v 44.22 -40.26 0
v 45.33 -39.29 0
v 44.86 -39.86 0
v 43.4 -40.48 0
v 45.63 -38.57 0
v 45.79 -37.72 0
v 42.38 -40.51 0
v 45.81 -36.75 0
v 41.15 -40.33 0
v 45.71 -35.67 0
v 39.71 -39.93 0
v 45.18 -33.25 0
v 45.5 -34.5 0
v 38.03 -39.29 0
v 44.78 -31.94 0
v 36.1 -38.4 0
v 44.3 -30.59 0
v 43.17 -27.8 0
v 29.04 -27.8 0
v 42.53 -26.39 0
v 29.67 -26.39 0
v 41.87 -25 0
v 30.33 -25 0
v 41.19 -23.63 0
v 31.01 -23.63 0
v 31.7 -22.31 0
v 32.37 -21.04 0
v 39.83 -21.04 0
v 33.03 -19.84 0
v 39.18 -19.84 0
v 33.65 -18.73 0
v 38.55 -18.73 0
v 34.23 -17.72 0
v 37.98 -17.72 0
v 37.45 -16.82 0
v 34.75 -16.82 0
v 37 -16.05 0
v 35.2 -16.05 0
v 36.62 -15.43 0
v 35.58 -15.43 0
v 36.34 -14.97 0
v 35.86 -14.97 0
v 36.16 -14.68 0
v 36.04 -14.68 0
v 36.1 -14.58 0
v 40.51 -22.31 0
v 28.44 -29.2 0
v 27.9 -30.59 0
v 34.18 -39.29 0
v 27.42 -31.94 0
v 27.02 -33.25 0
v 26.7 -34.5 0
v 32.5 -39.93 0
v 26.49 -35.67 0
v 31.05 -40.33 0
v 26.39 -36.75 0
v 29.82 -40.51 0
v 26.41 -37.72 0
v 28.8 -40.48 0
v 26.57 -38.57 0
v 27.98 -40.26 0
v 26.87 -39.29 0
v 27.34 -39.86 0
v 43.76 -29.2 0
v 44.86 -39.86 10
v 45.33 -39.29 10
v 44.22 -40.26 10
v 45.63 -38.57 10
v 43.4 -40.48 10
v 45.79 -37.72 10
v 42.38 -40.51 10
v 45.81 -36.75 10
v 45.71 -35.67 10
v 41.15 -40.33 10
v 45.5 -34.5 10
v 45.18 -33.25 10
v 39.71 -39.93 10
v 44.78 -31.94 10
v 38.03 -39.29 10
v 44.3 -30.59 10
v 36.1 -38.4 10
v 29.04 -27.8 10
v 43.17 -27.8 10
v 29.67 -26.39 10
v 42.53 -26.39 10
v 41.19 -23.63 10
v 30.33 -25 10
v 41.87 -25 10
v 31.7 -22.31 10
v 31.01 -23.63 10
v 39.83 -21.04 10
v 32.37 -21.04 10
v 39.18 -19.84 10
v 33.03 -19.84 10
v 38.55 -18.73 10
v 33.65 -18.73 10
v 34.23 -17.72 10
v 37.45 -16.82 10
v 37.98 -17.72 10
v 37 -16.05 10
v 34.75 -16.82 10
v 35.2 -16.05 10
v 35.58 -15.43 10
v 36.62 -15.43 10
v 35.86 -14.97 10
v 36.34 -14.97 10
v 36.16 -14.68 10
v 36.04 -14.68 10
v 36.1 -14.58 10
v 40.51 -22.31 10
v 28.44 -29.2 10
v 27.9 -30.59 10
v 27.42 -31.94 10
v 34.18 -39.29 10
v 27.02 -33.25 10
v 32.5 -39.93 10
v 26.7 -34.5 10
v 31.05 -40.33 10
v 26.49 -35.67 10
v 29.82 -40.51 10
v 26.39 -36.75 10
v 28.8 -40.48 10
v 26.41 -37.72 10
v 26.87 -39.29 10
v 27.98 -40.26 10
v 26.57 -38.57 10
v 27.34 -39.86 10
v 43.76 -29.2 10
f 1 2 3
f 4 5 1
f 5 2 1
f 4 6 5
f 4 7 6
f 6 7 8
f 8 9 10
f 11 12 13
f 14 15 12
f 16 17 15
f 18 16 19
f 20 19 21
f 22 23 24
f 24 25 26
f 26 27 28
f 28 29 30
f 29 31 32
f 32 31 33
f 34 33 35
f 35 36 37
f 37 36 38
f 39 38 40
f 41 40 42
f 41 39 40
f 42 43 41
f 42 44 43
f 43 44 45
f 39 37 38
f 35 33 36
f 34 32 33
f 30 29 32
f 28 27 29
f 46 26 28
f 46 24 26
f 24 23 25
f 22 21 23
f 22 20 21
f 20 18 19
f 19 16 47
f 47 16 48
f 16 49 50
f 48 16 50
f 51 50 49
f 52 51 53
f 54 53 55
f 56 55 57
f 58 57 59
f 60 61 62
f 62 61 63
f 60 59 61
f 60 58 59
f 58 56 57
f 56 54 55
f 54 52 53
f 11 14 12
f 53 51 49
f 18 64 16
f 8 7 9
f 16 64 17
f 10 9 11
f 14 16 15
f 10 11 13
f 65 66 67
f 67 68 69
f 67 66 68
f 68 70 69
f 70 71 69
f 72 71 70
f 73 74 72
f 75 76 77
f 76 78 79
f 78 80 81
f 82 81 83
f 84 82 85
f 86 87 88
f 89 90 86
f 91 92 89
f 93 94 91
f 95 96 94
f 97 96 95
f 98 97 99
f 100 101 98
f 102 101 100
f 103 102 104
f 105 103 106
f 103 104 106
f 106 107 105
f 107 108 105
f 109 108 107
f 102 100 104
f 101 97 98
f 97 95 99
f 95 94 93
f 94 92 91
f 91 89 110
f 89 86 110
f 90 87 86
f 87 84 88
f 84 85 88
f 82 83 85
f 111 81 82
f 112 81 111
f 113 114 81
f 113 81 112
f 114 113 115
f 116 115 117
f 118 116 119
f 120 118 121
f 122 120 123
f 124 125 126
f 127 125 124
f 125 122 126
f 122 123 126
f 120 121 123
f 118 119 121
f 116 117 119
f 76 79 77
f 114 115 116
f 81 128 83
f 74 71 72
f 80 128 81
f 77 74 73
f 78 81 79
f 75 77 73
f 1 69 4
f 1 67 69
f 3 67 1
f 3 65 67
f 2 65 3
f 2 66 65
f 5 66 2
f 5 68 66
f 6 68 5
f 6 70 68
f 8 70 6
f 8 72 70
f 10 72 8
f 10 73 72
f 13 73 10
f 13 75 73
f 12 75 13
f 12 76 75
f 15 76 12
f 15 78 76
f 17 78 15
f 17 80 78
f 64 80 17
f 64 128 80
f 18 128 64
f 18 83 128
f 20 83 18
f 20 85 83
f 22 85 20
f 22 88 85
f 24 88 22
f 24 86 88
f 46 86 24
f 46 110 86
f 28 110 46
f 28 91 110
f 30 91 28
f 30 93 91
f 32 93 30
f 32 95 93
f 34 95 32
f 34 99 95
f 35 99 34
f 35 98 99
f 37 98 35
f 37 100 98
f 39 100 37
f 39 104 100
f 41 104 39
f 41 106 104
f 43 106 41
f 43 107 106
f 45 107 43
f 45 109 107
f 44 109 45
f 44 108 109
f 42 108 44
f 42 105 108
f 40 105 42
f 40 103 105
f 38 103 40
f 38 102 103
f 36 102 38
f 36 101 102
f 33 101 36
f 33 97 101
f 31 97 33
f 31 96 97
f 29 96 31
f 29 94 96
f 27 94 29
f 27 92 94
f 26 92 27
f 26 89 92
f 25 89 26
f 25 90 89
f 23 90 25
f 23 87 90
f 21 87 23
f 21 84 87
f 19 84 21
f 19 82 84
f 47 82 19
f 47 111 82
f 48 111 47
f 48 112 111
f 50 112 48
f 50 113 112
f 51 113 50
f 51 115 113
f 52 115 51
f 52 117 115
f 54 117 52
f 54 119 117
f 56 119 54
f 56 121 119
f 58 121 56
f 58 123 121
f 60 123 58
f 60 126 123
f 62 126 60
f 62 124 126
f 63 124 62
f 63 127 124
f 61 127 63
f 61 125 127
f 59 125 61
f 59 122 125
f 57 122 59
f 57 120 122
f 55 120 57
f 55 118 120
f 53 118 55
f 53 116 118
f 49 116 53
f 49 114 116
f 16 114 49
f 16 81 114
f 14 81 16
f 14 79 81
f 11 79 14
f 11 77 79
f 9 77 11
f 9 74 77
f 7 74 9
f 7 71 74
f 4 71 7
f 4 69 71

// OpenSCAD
linear_extrude(height = 10, center = false) {

polygon(points=[[36.1,-14.58],[36.04,-14.68],[35.86,-14.97],[35.58,-15.43],[35.2,-16.05],[34.75,-16.82],[34.23,-17.72],[33.65,-18.73],[33.03,-19.84],[32.37,-21.04],[31.7,-22.31],[31.01,-23.63],[30.33,-25],[29.67,-26.39],[29.04,-27.8],[28.44,-29.2],[27.9,-30.59],[27.42,-31.94],[27.02,-33.25],[26.7,-34.5],[26.49,-35.67],[26.39,-36.75],[26.41,-37.72],[26.57,-38.57],[26.87,-39.29],[27.34,-39.86],[27.98,-40.26],[28.8,-40.48],[29.82,-40.51],[31.05,-40.33],[32.5,-39.93],[34.18,-39.29],[36.1,-38.4],[38.03,-39.29],[39.71,-39.93],[41.15,-40.33],[42.38,-40.51],[43.4,-40.48],[44.22,-40.26],[44.86,-39.86],[45.33,-39.29],[45.63,-38.57],[45.79,-37.72],[45.81,-36.75],[45.71,-35.67],[45.5,-34.5],[45.18,-33.25],[44.78,-31.94],[44.3,-30.59],[43.76,-29.2],[43.17,-27.8],[42.53,-26.39],[41.87,-25],[41.19,-23.63],[40.51,-22.31],[39.83,-21.04],[39.18,-19.84],[38.55,-18.73],[37.98,-17.72],[37.45,-16.82],[37,-16.05],[36.62,-15.43],[36.34,-14.97],[36.16,-14.68]]);

}
